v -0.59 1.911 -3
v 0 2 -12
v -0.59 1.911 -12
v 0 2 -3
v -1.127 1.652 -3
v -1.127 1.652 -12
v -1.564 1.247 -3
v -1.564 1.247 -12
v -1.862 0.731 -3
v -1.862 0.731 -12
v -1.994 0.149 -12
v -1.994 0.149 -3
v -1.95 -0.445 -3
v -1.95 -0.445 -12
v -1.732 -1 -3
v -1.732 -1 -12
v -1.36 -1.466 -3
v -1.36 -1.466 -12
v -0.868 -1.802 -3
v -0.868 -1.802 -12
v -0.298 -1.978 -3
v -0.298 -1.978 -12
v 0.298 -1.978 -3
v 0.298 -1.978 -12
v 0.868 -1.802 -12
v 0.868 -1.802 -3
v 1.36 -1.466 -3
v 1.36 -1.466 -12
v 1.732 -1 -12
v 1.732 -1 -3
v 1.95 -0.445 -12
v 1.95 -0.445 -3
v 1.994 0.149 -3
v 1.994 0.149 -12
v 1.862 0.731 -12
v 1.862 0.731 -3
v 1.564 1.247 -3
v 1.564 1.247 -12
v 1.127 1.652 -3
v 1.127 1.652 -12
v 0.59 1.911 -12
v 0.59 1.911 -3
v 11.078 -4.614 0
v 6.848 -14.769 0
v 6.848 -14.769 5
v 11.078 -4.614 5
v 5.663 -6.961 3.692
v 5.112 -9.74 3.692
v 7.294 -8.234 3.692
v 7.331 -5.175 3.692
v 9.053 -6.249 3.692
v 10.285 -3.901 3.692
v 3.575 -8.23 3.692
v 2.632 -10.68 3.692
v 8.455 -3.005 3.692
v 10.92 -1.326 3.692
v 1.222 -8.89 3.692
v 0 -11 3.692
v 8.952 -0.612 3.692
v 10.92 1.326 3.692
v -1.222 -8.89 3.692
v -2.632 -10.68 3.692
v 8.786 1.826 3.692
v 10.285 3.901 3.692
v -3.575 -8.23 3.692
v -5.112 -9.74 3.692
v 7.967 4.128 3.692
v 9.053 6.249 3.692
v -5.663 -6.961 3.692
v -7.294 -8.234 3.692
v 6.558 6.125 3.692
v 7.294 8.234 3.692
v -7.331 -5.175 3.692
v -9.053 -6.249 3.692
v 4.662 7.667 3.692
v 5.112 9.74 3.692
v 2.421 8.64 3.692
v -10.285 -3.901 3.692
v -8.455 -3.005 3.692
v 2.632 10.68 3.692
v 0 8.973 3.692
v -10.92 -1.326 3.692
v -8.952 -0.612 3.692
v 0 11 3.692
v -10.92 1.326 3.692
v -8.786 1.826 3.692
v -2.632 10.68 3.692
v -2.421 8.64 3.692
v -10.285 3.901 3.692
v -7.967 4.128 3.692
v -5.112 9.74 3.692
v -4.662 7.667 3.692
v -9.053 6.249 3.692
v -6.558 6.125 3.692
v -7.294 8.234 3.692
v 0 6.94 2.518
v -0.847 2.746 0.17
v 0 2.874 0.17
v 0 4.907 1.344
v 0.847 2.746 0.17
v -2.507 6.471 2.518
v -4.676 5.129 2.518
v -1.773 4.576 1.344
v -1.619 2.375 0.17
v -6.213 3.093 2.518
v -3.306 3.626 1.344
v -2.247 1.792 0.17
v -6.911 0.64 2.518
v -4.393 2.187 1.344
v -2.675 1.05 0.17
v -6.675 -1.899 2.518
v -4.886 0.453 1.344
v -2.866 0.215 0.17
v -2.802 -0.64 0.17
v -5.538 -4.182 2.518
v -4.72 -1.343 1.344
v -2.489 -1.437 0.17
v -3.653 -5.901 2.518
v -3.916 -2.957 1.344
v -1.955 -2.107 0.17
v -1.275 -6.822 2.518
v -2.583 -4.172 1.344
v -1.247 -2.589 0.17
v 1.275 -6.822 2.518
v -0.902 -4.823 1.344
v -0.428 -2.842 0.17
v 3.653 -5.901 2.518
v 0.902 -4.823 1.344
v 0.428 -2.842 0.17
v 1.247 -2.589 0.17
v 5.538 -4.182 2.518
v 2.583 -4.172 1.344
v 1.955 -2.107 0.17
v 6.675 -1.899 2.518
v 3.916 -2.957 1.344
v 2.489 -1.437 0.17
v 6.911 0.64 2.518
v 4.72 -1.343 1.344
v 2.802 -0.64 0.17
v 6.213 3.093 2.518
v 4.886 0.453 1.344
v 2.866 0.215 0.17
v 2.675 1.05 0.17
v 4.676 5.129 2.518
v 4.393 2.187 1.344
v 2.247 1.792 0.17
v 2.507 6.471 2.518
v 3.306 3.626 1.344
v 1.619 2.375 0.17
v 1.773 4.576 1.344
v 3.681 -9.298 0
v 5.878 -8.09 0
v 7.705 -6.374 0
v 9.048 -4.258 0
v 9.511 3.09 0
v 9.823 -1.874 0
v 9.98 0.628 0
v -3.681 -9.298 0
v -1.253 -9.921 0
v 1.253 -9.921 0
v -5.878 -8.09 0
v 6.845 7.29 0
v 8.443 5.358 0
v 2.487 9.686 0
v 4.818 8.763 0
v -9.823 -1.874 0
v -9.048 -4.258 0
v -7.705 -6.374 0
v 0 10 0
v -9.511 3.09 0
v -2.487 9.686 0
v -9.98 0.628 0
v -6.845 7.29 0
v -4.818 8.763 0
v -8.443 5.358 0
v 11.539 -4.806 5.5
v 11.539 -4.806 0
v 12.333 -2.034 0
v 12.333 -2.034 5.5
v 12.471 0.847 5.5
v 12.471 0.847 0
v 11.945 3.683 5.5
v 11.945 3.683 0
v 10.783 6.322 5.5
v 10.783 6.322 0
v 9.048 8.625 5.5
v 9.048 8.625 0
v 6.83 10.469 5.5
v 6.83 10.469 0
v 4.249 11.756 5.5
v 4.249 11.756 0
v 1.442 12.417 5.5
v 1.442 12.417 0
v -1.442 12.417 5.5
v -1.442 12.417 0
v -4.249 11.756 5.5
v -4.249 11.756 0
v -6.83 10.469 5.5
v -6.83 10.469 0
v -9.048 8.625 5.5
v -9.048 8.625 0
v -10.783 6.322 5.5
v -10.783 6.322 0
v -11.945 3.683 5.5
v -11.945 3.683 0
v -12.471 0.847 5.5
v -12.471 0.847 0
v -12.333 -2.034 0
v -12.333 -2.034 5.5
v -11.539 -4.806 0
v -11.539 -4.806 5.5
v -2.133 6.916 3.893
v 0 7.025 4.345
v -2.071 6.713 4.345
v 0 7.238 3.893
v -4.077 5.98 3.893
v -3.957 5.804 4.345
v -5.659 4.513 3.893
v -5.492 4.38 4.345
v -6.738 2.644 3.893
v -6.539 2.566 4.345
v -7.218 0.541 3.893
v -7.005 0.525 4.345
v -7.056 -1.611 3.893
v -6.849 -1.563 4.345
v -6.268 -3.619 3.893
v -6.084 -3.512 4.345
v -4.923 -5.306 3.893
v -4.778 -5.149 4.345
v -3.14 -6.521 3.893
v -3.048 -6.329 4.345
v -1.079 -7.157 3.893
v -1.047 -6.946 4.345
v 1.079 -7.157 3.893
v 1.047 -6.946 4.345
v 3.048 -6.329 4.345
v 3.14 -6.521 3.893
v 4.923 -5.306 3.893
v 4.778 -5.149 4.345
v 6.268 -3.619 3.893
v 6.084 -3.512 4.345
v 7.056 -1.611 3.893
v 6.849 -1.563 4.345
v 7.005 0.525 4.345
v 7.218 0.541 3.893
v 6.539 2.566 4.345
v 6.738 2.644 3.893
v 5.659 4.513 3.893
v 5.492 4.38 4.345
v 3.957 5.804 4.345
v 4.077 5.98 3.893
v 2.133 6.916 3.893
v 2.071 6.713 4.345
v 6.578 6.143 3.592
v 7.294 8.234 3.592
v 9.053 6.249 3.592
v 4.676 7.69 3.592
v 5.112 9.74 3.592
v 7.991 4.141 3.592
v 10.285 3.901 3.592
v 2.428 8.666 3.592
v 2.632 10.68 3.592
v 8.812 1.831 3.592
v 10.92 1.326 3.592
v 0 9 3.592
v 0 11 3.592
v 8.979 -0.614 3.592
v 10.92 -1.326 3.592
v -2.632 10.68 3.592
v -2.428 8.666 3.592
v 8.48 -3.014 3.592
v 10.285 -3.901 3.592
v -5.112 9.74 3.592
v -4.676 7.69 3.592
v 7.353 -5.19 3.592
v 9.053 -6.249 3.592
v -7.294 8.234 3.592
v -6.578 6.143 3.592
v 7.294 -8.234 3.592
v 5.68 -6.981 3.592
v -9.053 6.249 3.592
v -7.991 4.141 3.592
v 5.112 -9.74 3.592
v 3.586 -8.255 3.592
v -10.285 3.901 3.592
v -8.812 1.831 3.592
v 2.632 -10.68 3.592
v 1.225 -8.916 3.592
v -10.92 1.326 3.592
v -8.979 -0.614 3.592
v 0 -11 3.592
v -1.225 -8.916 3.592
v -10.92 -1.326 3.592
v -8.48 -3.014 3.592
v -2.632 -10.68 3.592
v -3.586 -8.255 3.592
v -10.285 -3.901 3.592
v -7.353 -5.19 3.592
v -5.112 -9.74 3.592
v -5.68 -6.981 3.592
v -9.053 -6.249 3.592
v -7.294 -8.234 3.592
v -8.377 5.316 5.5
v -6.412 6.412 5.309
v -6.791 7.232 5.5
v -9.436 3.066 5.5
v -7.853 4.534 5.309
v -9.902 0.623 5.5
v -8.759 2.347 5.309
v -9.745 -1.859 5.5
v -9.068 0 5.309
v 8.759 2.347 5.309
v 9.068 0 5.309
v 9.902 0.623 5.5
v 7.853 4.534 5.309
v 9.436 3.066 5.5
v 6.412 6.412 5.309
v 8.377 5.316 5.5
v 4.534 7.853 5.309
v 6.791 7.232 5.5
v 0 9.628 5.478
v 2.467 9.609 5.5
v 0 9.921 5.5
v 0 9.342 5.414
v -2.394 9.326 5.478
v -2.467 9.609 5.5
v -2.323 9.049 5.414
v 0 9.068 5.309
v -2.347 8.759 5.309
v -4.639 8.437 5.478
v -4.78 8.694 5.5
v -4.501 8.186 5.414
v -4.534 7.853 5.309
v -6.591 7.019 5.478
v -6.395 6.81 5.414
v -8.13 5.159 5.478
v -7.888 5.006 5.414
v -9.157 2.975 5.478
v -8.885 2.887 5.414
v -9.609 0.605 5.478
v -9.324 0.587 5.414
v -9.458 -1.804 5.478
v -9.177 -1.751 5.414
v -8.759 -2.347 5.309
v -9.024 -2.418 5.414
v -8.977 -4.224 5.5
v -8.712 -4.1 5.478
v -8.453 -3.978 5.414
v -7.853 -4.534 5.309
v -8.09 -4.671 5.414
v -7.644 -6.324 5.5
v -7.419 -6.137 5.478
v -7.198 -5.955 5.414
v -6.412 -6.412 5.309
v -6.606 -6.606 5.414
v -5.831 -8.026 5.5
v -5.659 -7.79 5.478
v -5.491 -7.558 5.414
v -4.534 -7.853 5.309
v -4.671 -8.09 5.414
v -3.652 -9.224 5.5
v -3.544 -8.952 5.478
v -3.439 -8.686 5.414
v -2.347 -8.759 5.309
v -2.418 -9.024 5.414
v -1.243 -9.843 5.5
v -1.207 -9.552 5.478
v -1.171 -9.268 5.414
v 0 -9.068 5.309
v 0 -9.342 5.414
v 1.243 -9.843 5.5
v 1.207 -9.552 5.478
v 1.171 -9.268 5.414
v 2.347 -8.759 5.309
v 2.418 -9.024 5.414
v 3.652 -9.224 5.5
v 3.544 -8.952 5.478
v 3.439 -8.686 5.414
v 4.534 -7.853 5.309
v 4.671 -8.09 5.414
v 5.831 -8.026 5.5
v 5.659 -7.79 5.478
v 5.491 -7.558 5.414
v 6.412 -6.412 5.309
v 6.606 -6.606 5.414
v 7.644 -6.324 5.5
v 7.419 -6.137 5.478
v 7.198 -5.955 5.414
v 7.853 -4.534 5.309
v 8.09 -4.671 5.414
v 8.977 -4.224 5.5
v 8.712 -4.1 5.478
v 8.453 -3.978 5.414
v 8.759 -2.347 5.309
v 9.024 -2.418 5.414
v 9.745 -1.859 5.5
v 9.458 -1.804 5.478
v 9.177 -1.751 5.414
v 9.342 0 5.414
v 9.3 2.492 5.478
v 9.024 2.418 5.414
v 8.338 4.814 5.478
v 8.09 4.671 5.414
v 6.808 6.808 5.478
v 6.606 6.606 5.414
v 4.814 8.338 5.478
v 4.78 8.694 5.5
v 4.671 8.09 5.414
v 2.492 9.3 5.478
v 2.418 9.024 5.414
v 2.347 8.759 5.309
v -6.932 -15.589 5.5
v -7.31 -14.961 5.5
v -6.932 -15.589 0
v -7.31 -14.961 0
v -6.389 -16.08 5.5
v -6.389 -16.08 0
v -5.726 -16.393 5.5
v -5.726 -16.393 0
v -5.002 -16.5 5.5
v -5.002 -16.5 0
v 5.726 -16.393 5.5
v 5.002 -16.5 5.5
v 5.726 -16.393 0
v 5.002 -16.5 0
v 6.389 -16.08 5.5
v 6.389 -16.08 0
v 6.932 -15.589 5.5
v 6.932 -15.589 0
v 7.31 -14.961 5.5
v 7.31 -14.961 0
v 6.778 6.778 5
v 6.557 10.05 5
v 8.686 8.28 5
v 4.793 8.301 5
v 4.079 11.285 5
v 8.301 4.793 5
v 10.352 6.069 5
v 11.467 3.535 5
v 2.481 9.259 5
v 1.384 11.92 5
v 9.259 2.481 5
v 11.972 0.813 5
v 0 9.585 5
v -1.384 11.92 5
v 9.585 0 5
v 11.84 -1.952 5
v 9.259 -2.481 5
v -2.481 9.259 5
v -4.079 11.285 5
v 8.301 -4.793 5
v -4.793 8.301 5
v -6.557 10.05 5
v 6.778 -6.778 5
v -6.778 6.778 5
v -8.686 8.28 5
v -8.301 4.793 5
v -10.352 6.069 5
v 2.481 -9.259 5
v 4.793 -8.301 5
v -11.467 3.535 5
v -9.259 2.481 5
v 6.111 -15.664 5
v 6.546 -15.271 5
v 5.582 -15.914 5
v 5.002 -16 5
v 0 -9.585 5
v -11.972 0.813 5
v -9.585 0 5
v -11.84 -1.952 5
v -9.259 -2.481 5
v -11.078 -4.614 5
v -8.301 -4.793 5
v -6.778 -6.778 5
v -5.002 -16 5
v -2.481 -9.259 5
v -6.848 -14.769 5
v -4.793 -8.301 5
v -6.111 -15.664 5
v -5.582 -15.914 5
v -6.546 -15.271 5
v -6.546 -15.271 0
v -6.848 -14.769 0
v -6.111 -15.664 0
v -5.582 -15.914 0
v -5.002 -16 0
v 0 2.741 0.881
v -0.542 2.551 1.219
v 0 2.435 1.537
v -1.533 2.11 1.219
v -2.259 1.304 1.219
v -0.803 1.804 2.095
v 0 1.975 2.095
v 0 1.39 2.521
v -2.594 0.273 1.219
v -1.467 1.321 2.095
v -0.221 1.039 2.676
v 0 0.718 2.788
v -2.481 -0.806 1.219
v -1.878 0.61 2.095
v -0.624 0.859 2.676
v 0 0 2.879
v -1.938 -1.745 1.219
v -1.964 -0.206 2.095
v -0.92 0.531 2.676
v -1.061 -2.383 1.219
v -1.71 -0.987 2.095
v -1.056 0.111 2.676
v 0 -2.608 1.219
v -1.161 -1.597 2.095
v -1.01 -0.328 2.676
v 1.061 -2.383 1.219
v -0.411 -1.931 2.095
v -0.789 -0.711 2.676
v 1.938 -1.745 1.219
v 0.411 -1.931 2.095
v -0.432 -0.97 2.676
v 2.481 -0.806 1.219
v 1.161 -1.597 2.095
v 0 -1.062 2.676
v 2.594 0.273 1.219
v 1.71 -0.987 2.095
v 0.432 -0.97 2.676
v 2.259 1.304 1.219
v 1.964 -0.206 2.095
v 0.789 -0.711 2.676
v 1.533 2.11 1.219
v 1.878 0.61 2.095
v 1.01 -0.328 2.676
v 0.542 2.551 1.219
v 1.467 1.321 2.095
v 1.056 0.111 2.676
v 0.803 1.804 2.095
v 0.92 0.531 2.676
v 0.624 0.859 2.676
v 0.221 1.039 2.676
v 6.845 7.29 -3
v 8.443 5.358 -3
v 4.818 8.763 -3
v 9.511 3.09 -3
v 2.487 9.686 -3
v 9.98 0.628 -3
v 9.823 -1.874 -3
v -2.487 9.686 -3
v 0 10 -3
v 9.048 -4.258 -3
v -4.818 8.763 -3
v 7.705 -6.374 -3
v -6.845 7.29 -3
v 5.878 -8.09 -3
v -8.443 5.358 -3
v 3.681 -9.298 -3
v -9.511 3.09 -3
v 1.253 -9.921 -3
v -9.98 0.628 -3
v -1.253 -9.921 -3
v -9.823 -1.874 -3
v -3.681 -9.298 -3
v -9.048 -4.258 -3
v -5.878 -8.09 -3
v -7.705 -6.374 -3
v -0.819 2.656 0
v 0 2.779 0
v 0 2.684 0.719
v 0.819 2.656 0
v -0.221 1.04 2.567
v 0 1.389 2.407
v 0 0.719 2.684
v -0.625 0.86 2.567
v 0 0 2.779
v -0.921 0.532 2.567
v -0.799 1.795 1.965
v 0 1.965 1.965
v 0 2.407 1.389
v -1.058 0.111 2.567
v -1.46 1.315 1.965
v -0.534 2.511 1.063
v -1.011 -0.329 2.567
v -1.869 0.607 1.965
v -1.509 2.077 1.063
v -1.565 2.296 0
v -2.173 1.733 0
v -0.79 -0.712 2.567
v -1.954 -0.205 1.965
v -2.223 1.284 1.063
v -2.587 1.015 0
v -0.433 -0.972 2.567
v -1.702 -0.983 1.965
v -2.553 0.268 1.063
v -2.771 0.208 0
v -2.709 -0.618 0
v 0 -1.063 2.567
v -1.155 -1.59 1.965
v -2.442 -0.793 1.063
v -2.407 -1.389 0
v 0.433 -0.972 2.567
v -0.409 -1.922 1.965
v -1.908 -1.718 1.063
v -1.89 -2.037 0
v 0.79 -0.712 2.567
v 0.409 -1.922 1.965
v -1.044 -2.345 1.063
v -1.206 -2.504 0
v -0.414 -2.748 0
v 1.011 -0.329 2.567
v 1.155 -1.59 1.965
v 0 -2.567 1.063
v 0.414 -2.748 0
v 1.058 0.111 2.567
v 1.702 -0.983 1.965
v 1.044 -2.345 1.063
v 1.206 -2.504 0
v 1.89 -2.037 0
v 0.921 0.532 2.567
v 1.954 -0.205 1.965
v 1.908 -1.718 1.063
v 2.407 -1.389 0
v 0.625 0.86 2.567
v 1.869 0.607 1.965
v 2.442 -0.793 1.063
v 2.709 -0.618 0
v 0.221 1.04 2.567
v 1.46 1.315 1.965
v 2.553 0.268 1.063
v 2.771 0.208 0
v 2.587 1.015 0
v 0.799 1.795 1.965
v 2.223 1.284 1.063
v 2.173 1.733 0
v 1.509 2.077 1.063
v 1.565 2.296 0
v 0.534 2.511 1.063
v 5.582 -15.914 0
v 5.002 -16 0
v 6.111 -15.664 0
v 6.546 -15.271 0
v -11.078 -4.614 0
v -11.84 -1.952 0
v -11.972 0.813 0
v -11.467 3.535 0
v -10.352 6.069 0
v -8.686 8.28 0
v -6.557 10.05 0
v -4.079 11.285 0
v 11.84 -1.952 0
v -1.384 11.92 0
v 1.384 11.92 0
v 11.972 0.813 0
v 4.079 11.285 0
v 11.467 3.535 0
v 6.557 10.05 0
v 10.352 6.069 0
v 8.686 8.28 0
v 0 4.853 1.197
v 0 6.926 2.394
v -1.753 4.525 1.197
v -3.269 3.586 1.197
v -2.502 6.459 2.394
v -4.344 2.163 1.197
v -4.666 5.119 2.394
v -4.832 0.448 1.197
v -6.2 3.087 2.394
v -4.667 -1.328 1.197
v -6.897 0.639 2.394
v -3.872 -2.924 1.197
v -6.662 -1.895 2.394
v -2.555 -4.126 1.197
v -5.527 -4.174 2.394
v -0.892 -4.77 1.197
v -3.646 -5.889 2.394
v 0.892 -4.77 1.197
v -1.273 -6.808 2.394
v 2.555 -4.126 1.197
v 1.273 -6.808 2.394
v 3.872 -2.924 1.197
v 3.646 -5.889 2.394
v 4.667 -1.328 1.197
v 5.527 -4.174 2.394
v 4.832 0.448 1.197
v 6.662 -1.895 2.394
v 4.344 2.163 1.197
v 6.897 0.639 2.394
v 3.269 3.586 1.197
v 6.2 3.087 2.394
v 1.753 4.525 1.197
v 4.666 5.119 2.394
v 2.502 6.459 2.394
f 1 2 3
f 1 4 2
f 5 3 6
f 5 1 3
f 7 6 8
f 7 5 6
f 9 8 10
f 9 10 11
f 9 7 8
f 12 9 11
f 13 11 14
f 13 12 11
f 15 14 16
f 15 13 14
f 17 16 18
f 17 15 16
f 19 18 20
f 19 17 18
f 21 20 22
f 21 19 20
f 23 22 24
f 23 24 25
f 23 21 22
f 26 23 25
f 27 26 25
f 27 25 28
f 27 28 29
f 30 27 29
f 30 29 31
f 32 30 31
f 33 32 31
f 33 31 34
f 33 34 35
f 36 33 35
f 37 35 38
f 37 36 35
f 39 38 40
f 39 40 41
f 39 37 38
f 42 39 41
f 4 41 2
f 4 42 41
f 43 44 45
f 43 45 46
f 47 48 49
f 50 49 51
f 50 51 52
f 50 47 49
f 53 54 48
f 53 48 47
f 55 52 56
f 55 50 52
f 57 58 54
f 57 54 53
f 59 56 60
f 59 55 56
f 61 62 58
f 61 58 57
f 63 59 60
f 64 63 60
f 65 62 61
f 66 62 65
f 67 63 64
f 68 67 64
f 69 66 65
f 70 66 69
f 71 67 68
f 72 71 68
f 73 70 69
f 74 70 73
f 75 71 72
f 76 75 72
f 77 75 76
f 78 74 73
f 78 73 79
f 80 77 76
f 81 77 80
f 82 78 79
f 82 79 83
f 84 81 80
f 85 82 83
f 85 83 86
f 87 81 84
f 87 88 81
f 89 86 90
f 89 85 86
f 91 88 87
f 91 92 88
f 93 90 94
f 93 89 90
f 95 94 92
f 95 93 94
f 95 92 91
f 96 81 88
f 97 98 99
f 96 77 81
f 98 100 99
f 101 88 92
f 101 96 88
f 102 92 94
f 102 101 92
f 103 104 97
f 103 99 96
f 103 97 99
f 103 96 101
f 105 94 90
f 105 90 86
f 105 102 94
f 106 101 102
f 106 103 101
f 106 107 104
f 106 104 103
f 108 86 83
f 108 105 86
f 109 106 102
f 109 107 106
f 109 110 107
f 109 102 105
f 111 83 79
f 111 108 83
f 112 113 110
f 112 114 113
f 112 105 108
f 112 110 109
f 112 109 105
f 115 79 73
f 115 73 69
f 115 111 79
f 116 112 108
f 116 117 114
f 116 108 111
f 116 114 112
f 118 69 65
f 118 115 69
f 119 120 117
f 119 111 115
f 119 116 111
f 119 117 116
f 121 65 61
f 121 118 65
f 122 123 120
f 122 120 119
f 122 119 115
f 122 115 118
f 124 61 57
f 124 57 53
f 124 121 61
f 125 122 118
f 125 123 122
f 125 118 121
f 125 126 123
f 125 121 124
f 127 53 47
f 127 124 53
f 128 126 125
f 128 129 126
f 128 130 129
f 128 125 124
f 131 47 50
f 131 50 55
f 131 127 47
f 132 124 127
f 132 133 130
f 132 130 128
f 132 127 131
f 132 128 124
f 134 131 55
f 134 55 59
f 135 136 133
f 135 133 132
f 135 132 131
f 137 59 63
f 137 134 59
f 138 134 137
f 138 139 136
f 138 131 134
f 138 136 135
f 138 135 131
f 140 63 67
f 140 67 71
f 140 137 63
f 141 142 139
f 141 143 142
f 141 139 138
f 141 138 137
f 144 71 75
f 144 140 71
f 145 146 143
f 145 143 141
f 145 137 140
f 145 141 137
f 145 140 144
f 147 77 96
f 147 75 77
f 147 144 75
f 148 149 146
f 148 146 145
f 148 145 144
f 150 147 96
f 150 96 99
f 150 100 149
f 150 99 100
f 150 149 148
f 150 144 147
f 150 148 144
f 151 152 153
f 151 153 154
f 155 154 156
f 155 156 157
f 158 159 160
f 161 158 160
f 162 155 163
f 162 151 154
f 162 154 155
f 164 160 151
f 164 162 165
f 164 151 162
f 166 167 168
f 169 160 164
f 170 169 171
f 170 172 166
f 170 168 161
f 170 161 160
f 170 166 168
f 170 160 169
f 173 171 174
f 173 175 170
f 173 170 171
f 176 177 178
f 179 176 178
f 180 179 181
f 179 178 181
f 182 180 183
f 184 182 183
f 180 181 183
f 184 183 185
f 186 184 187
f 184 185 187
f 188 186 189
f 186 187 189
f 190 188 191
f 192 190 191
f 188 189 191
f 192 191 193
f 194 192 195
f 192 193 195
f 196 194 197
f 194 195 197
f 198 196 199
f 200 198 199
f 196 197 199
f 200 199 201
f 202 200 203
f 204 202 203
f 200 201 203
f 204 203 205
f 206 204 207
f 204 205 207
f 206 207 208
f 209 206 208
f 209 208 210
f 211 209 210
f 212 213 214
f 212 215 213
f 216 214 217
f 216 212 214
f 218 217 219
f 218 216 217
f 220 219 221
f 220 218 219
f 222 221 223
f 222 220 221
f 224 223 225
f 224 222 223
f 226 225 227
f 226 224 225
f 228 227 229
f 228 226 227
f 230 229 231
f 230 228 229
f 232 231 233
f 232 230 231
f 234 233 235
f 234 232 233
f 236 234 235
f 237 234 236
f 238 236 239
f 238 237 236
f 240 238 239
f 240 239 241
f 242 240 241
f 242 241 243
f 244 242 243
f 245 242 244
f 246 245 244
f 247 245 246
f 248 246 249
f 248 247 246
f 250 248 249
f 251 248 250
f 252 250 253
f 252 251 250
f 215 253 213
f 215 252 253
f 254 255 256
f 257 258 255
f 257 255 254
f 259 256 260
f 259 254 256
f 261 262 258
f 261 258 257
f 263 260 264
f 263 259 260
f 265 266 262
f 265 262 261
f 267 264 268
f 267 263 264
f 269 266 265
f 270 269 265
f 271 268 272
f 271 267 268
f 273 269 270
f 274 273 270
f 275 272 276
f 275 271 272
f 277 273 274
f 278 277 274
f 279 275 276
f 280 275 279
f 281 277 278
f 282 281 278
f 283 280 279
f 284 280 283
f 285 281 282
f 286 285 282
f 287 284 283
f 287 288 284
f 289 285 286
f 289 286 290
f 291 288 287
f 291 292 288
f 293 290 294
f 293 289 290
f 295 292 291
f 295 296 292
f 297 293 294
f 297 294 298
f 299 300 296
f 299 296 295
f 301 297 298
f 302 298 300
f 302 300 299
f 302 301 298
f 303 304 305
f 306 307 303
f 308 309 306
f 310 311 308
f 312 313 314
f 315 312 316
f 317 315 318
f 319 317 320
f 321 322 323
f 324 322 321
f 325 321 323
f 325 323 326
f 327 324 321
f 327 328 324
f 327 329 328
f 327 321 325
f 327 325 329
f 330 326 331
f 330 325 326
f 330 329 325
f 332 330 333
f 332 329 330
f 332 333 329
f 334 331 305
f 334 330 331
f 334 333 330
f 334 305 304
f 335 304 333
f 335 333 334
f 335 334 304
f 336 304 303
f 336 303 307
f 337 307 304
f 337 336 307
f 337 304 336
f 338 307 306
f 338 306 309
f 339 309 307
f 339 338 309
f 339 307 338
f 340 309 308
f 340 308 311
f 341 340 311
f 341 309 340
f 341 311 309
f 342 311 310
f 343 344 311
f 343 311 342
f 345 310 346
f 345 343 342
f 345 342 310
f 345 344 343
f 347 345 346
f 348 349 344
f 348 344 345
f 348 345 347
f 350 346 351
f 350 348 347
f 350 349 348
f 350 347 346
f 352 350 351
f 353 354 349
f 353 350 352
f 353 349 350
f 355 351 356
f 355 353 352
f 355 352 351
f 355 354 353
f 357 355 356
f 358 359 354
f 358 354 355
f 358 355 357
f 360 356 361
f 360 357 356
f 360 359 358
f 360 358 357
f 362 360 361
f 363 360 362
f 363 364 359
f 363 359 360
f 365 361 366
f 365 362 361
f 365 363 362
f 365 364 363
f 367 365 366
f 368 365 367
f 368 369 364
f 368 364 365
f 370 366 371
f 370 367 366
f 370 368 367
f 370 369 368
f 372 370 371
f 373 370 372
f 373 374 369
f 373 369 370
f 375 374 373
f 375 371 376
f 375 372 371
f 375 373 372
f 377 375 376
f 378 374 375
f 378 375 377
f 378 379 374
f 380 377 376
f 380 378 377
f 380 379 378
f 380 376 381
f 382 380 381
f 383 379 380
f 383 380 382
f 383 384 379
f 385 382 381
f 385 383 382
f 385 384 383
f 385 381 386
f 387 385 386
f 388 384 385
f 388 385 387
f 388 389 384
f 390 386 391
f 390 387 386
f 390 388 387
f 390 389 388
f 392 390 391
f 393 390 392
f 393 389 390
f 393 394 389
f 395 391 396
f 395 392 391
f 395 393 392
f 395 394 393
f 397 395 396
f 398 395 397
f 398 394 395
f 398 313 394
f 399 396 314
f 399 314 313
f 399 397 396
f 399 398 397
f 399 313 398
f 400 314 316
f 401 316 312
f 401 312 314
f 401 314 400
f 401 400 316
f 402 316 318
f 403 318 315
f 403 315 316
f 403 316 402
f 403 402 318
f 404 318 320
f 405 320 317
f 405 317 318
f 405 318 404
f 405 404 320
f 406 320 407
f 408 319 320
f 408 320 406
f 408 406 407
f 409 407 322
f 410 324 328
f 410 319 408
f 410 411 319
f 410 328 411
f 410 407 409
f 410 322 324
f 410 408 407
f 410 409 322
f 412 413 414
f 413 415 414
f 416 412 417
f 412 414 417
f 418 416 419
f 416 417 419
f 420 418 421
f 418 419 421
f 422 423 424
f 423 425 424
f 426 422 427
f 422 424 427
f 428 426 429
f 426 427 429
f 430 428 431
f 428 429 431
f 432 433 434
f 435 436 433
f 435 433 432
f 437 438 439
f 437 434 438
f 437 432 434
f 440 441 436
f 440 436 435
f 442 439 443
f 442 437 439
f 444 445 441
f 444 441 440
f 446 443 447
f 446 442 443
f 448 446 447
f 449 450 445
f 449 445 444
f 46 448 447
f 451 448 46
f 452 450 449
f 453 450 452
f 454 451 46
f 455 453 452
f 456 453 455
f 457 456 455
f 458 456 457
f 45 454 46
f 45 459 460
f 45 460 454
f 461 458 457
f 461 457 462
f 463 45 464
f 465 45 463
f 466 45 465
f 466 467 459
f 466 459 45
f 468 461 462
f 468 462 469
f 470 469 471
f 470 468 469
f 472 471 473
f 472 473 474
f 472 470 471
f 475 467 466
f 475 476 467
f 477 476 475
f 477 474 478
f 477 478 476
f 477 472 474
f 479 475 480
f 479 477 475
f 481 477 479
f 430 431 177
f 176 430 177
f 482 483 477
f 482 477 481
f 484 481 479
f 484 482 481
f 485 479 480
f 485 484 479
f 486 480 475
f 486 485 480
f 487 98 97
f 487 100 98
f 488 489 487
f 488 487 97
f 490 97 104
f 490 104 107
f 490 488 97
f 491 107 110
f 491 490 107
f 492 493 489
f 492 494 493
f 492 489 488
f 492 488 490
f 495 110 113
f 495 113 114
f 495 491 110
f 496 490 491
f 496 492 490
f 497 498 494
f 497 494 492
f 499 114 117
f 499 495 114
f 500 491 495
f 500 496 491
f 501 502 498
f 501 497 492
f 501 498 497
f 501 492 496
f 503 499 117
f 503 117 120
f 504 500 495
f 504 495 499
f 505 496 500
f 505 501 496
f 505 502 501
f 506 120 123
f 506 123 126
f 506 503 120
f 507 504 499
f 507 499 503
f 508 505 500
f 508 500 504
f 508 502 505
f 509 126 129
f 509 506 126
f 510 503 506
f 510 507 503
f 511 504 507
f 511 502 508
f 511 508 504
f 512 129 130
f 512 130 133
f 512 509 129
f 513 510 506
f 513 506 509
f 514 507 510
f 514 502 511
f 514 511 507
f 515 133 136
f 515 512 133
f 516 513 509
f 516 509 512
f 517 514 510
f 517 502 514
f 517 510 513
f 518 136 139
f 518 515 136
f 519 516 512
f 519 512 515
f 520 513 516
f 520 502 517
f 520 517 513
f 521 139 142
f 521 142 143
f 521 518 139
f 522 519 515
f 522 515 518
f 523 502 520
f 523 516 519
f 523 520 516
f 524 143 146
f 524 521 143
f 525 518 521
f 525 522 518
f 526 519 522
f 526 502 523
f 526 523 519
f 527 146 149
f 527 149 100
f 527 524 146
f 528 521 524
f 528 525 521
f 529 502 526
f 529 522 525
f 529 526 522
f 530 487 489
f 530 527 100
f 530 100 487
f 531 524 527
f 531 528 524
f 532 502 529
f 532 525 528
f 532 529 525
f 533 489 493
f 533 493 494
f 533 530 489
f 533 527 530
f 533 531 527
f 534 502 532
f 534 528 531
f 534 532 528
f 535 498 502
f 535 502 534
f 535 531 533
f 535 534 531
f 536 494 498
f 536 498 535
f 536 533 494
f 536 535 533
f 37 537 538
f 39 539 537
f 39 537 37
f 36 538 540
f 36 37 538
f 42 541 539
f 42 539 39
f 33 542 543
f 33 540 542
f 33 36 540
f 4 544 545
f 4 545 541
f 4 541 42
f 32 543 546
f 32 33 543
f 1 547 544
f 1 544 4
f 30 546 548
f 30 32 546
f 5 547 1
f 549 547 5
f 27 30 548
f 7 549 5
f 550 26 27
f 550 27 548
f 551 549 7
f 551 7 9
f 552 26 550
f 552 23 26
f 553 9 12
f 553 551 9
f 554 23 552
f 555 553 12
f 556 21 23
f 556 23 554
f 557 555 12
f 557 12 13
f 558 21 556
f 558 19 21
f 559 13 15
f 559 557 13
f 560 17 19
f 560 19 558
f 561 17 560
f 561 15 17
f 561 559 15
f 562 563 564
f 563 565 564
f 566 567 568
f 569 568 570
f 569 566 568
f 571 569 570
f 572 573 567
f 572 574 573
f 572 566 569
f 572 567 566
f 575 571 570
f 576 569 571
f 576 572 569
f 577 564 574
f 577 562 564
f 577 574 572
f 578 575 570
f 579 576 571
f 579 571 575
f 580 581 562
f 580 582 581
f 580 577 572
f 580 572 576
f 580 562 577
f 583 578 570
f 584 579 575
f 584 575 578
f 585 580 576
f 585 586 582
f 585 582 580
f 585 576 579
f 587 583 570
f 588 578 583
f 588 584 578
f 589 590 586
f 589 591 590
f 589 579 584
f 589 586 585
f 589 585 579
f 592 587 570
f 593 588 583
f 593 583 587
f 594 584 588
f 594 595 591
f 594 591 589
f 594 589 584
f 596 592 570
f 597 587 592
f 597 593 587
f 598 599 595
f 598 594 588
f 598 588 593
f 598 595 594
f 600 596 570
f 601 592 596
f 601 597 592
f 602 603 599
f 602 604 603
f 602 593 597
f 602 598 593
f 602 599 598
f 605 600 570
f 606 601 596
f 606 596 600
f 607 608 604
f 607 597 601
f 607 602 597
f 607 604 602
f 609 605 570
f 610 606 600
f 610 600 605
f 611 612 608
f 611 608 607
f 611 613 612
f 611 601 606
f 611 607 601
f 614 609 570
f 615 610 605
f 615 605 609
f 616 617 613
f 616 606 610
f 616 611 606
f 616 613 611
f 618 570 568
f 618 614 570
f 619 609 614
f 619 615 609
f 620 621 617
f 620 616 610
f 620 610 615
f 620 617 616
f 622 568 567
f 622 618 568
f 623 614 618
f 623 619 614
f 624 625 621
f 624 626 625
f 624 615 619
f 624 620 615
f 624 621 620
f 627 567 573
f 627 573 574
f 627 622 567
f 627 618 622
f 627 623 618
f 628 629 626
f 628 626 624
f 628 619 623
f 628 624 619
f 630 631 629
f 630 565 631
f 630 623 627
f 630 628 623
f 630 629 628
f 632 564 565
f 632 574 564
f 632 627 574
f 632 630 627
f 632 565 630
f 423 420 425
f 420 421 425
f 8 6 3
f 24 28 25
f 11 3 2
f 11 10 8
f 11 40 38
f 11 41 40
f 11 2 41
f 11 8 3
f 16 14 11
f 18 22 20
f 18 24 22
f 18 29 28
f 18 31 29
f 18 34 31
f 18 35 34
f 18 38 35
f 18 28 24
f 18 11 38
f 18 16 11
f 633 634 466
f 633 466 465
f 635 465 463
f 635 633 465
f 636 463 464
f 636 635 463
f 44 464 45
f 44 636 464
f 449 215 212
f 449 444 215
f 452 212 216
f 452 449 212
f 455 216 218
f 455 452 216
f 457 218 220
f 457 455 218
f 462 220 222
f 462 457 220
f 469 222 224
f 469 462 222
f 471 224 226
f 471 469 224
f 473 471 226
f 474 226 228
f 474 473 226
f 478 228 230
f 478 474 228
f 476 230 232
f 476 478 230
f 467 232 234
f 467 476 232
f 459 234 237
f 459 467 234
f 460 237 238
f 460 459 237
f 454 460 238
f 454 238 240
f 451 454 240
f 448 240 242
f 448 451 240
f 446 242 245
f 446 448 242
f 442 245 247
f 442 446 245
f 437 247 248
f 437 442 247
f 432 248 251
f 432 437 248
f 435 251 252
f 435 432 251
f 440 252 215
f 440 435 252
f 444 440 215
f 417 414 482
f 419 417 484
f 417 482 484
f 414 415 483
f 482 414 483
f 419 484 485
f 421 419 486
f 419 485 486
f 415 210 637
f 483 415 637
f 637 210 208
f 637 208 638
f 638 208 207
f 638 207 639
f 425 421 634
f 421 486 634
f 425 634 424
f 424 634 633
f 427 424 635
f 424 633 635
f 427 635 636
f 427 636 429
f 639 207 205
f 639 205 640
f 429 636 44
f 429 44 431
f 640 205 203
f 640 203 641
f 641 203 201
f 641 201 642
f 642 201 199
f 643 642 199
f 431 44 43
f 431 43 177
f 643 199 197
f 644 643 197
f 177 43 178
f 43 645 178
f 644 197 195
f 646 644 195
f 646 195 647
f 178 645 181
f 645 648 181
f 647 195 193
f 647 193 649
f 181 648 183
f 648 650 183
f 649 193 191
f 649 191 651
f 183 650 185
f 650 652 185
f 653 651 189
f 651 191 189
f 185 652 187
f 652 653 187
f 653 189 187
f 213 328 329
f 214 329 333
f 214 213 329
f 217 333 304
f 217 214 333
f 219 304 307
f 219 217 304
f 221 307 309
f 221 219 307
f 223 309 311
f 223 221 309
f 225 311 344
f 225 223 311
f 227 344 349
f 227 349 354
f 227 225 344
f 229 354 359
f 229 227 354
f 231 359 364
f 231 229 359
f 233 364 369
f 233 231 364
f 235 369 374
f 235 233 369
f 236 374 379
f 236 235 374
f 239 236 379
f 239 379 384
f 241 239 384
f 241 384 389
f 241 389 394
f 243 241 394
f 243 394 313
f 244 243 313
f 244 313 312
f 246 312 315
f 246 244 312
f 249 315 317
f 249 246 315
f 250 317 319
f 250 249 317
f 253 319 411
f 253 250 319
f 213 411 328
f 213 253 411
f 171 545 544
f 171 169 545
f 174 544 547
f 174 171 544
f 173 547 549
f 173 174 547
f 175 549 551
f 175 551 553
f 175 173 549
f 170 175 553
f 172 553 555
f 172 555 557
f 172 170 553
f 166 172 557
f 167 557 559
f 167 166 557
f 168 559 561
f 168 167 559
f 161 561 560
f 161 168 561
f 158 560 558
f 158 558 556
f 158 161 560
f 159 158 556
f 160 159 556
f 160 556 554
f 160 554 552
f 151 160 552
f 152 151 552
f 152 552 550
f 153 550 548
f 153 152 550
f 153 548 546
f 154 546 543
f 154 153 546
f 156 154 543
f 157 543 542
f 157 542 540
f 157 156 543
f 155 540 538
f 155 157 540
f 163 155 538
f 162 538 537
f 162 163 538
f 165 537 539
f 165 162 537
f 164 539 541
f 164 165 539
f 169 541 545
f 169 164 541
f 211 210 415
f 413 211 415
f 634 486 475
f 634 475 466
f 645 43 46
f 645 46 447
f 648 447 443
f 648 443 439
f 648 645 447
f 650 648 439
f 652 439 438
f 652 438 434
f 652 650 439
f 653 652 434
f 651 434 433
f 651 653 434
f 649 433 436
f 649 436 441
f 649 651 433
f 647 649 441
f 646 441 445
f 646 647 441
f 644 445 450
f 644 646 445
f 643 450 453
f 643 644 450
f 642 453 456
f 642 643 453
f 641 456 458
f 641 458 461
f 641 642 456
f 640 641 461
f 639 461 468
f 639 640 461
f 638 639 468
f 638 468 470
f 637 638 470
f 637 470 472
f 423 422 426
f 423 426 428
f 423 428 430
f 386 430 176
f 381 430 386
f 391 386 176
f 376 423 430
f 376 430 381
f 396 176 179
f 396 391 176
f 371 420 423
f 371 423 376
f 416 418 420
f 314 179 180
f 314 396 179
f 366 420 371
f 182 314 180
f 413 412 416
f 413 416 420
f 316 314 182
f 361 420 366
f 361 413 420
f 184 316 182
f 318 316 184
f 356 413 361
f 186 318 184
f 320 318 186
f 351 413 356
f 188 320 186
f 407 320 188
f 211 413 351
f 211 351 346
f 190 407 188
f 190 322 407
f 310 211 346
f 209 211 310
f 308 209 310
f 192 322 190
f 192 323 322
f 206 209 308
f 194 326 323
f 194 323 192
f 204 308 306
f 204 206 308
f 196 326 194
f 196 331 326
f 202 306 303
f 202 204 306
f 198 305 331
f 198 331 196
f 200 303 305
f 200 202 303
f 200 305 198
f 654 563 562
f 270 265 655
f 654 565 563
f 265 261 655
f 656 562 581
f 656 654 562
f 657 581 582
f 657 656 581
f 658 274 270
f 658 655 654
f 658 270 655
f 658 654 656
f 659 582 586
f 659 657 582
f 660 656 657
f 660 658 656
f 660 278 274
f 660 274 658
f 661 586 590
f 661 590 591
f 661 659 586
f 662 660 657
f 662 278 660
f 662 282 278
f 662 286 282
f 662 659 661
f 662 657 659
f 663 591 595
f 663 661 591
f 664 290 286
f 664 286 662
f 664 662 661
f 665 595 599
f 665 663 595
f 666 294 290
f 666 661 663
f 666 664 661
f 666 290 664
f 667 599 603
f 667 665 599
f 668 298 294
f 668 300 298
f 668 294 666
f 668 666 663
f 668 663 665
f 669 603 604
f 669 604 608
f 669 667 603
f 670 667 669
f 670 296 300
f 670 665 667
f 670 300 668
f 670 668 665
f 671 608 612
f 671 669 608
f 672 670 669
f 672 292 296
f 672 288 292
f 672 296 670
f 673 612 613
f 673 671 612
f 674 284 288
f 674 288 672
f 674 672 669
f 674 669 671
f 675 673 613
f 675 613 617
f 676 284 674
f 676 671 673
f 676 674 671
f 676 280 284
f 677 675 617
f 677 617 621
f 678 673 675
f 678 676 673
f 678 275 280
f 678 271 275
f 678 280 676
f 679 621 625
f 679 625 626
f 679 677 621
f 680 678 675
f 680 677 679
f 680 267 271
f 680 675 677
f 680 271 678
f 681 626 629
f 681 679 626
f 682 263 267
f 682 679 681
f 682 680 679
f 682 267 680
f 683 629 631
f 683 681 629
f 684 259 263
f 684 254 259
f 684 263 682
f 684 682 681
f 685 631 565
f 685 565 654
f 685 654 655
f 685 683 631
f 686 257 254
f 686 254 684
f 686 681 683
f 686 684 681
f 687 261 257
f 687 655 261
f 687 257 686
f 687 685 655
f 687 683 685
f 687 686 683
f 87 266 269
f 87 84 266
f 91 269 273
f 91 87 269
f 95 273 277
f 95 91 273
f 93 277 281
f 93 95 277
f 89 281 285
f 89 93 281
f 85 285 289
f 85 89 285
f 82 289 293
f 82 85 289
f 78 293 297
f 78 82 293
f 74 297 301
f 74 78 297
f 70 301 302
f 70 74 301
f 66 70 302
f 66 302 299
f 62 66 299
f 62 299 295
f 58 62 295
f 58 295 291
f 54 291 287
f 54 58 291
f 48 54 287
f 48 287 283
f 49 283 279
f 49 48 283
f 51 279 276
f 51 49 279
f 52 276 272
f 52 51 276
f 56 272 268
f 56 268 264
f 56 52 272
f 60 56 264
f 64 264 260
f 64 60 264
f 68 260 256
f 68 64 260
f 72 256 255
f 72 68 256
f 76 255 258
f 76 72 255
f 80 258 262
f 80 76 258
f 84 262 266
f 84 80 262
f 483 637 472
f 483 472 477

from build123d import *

# Parameters (mm, degrees)
EXTRUDE_THIN1_DEPTH = 5
SKETCH5_R           = 9.973205081
EXTRUDE1_DEPTH      = 0.5
FILLET1_R           = 2


with BuildPart() as part:
    # Sketch1 → Revolve1 (revolve)
    with BuildSketch(Plane(origin=(0, 0, 0), x_dir=(0, 0, -1), z_dir=(1, 0, 0))):
        Polygon((0, 0), (12, 0), (12, 2), (3, 2), (3, 10), (0, 10), align=None)
    revolve(axis=Axis((0, 0, 0), (0, 0, 1)))


with BuildPart() as body_2:
    # Sketch2 → Revolve-Thin2 (revolve)
    with BuildSketch(Plane(origin=(0, 0, 0), x_dir=(0, 0, -1), z_dir=(1, 0, 0))):
        with BuildLine():
            ThreePointArc((-2.778971463, 0), (-1.965029566, 1.965029566), (0, 2.778971463))
            Line((0, 2.778971463), (-3.5917125, 9))
            Line((-3.5917125, 9), (-3.5917125, 11))
            Line((-3.5917125, 11), (-3.6917125, 11))
            Line((-3.6917125, 11), (-3.6917125, 8.973205081))
            Line((-3.6917125, 8.973205081), (-0.170294669, 2.873930482))
            ThreePointArc((-0.170294669, 2.873930482), (-2.095083552, 1.974614291), (-2.878971463, 0))
            Line((-2.878971463, 0), (-2.778971463, 0))
        make_face()
    revolve(axis=Axis((0, 0, 0), (0, 0, 1)))


with BuildPart() as body_3:
    # Sketch4 → Extrude-Thin1 (new body)
    with BuildSketch(Plane.XY):
        with BuildLine():
            Line((7.309705434, -14.961177707), (11.539212944, -4.805888537))
            ThreePointArc((11.539212944, -4.805888537), (0, 12.5), (-11.539212944, -4.805888537))
            Line((-11.539212944, -4.805888537), (-7.309705434, -14.961177707))
            ThreePointArc((-7.309705434, -14.961177707), (-6.388775915, -16.08001734), (-5.001862845, -16.5))
            Line((-5.001862845, -16.5), (5.001862845, -16.5))
            ThreePointArc((5.001862845, -16.5), (6.388775915, -16.08001734), (7.309705434, -14.961177707))
        make_face()
        with BuildLine():
            Line((6.848136916, -14.768942166), (11.077644426, -4.613652995))
            ThreePointArc((11.077644426, -4.613652995), (0, 12), (-11.077644426, -4.613652995))
            Line((-11.077644426, -4.613652995), (-6.848136916, -14.768942166))
            ThreePointArc((-6.848136916, -14.768942166), (-6.111393301, -15.664013872), (-5.001862845, -16))
            Line((-5.001862845, -16), (5.001862845, -16))
            ThreePointArc((5.001862845, -16), (6.111393301, -15.664013872), (6.848136916, -14.768942166))
        make_face(mode=Mode.SUBTRACT)
    extrude(amount=EXTRUDE_THIN1_DEPTH)

    # Sketch5 → Extrude1 (add)
    with BuildSketch(Plane.XY.offset(5)):
        with BuildLine():
            Line((-11.539212944, -4.805888537), (-7.309705434, -14.961177707))
            ThreePointArc((-7.309705434, -14.961177707), (-6.388775915, -16.08001734), (-5.001862845, -16.5))
            Line((-5.001862845, -16.5), (5.001862845, -16.5))
            ThreePointArc((5.001862845, -16.5), (6.388775915, -16.08001734), (7.309705434, -14.961177707))
            Line((7.309705434, -14.961177707), (11.539212944, -4.805888537))
            ThreePointArc((11.539212944, -4.805888537), (0, 12.5), (-11.539212944, -4.805888537))
        make_face()
        Circle(SKETCH5_R, mode=Mode.SUBTRACT)
    extrude(amount=EXTRUDE1_DEPTH)

    # Sketch6 → Revolve-Thin3 (revolve)
    with BuildSketch(Plane(origin=(0, 0, 0), x_dir=(0, 0, -1), z_dir=(1, 0, 0))):
        Polygon((-5.5, 9.973205081), (-5.5, 9.473205081), (-4.345447499, 7.024699681), (-3.893202995, 7.237948147), (-5, 9.585176568), (-5, 9.973205081), align=None)
    revolve(axis=Axis((0, 0, 0), (0, 0, 1)))

    # Fillet1
    fillet1_edges = [body_3.edges().sort_by_distance(p)[0] for p in [
        (0, -9.473205081, 5.5),
    ]]
    fillet(fillet1_edges, radius=FILLET1_R)


solid = Compound([part.part, body_2.part, body_3.part])
